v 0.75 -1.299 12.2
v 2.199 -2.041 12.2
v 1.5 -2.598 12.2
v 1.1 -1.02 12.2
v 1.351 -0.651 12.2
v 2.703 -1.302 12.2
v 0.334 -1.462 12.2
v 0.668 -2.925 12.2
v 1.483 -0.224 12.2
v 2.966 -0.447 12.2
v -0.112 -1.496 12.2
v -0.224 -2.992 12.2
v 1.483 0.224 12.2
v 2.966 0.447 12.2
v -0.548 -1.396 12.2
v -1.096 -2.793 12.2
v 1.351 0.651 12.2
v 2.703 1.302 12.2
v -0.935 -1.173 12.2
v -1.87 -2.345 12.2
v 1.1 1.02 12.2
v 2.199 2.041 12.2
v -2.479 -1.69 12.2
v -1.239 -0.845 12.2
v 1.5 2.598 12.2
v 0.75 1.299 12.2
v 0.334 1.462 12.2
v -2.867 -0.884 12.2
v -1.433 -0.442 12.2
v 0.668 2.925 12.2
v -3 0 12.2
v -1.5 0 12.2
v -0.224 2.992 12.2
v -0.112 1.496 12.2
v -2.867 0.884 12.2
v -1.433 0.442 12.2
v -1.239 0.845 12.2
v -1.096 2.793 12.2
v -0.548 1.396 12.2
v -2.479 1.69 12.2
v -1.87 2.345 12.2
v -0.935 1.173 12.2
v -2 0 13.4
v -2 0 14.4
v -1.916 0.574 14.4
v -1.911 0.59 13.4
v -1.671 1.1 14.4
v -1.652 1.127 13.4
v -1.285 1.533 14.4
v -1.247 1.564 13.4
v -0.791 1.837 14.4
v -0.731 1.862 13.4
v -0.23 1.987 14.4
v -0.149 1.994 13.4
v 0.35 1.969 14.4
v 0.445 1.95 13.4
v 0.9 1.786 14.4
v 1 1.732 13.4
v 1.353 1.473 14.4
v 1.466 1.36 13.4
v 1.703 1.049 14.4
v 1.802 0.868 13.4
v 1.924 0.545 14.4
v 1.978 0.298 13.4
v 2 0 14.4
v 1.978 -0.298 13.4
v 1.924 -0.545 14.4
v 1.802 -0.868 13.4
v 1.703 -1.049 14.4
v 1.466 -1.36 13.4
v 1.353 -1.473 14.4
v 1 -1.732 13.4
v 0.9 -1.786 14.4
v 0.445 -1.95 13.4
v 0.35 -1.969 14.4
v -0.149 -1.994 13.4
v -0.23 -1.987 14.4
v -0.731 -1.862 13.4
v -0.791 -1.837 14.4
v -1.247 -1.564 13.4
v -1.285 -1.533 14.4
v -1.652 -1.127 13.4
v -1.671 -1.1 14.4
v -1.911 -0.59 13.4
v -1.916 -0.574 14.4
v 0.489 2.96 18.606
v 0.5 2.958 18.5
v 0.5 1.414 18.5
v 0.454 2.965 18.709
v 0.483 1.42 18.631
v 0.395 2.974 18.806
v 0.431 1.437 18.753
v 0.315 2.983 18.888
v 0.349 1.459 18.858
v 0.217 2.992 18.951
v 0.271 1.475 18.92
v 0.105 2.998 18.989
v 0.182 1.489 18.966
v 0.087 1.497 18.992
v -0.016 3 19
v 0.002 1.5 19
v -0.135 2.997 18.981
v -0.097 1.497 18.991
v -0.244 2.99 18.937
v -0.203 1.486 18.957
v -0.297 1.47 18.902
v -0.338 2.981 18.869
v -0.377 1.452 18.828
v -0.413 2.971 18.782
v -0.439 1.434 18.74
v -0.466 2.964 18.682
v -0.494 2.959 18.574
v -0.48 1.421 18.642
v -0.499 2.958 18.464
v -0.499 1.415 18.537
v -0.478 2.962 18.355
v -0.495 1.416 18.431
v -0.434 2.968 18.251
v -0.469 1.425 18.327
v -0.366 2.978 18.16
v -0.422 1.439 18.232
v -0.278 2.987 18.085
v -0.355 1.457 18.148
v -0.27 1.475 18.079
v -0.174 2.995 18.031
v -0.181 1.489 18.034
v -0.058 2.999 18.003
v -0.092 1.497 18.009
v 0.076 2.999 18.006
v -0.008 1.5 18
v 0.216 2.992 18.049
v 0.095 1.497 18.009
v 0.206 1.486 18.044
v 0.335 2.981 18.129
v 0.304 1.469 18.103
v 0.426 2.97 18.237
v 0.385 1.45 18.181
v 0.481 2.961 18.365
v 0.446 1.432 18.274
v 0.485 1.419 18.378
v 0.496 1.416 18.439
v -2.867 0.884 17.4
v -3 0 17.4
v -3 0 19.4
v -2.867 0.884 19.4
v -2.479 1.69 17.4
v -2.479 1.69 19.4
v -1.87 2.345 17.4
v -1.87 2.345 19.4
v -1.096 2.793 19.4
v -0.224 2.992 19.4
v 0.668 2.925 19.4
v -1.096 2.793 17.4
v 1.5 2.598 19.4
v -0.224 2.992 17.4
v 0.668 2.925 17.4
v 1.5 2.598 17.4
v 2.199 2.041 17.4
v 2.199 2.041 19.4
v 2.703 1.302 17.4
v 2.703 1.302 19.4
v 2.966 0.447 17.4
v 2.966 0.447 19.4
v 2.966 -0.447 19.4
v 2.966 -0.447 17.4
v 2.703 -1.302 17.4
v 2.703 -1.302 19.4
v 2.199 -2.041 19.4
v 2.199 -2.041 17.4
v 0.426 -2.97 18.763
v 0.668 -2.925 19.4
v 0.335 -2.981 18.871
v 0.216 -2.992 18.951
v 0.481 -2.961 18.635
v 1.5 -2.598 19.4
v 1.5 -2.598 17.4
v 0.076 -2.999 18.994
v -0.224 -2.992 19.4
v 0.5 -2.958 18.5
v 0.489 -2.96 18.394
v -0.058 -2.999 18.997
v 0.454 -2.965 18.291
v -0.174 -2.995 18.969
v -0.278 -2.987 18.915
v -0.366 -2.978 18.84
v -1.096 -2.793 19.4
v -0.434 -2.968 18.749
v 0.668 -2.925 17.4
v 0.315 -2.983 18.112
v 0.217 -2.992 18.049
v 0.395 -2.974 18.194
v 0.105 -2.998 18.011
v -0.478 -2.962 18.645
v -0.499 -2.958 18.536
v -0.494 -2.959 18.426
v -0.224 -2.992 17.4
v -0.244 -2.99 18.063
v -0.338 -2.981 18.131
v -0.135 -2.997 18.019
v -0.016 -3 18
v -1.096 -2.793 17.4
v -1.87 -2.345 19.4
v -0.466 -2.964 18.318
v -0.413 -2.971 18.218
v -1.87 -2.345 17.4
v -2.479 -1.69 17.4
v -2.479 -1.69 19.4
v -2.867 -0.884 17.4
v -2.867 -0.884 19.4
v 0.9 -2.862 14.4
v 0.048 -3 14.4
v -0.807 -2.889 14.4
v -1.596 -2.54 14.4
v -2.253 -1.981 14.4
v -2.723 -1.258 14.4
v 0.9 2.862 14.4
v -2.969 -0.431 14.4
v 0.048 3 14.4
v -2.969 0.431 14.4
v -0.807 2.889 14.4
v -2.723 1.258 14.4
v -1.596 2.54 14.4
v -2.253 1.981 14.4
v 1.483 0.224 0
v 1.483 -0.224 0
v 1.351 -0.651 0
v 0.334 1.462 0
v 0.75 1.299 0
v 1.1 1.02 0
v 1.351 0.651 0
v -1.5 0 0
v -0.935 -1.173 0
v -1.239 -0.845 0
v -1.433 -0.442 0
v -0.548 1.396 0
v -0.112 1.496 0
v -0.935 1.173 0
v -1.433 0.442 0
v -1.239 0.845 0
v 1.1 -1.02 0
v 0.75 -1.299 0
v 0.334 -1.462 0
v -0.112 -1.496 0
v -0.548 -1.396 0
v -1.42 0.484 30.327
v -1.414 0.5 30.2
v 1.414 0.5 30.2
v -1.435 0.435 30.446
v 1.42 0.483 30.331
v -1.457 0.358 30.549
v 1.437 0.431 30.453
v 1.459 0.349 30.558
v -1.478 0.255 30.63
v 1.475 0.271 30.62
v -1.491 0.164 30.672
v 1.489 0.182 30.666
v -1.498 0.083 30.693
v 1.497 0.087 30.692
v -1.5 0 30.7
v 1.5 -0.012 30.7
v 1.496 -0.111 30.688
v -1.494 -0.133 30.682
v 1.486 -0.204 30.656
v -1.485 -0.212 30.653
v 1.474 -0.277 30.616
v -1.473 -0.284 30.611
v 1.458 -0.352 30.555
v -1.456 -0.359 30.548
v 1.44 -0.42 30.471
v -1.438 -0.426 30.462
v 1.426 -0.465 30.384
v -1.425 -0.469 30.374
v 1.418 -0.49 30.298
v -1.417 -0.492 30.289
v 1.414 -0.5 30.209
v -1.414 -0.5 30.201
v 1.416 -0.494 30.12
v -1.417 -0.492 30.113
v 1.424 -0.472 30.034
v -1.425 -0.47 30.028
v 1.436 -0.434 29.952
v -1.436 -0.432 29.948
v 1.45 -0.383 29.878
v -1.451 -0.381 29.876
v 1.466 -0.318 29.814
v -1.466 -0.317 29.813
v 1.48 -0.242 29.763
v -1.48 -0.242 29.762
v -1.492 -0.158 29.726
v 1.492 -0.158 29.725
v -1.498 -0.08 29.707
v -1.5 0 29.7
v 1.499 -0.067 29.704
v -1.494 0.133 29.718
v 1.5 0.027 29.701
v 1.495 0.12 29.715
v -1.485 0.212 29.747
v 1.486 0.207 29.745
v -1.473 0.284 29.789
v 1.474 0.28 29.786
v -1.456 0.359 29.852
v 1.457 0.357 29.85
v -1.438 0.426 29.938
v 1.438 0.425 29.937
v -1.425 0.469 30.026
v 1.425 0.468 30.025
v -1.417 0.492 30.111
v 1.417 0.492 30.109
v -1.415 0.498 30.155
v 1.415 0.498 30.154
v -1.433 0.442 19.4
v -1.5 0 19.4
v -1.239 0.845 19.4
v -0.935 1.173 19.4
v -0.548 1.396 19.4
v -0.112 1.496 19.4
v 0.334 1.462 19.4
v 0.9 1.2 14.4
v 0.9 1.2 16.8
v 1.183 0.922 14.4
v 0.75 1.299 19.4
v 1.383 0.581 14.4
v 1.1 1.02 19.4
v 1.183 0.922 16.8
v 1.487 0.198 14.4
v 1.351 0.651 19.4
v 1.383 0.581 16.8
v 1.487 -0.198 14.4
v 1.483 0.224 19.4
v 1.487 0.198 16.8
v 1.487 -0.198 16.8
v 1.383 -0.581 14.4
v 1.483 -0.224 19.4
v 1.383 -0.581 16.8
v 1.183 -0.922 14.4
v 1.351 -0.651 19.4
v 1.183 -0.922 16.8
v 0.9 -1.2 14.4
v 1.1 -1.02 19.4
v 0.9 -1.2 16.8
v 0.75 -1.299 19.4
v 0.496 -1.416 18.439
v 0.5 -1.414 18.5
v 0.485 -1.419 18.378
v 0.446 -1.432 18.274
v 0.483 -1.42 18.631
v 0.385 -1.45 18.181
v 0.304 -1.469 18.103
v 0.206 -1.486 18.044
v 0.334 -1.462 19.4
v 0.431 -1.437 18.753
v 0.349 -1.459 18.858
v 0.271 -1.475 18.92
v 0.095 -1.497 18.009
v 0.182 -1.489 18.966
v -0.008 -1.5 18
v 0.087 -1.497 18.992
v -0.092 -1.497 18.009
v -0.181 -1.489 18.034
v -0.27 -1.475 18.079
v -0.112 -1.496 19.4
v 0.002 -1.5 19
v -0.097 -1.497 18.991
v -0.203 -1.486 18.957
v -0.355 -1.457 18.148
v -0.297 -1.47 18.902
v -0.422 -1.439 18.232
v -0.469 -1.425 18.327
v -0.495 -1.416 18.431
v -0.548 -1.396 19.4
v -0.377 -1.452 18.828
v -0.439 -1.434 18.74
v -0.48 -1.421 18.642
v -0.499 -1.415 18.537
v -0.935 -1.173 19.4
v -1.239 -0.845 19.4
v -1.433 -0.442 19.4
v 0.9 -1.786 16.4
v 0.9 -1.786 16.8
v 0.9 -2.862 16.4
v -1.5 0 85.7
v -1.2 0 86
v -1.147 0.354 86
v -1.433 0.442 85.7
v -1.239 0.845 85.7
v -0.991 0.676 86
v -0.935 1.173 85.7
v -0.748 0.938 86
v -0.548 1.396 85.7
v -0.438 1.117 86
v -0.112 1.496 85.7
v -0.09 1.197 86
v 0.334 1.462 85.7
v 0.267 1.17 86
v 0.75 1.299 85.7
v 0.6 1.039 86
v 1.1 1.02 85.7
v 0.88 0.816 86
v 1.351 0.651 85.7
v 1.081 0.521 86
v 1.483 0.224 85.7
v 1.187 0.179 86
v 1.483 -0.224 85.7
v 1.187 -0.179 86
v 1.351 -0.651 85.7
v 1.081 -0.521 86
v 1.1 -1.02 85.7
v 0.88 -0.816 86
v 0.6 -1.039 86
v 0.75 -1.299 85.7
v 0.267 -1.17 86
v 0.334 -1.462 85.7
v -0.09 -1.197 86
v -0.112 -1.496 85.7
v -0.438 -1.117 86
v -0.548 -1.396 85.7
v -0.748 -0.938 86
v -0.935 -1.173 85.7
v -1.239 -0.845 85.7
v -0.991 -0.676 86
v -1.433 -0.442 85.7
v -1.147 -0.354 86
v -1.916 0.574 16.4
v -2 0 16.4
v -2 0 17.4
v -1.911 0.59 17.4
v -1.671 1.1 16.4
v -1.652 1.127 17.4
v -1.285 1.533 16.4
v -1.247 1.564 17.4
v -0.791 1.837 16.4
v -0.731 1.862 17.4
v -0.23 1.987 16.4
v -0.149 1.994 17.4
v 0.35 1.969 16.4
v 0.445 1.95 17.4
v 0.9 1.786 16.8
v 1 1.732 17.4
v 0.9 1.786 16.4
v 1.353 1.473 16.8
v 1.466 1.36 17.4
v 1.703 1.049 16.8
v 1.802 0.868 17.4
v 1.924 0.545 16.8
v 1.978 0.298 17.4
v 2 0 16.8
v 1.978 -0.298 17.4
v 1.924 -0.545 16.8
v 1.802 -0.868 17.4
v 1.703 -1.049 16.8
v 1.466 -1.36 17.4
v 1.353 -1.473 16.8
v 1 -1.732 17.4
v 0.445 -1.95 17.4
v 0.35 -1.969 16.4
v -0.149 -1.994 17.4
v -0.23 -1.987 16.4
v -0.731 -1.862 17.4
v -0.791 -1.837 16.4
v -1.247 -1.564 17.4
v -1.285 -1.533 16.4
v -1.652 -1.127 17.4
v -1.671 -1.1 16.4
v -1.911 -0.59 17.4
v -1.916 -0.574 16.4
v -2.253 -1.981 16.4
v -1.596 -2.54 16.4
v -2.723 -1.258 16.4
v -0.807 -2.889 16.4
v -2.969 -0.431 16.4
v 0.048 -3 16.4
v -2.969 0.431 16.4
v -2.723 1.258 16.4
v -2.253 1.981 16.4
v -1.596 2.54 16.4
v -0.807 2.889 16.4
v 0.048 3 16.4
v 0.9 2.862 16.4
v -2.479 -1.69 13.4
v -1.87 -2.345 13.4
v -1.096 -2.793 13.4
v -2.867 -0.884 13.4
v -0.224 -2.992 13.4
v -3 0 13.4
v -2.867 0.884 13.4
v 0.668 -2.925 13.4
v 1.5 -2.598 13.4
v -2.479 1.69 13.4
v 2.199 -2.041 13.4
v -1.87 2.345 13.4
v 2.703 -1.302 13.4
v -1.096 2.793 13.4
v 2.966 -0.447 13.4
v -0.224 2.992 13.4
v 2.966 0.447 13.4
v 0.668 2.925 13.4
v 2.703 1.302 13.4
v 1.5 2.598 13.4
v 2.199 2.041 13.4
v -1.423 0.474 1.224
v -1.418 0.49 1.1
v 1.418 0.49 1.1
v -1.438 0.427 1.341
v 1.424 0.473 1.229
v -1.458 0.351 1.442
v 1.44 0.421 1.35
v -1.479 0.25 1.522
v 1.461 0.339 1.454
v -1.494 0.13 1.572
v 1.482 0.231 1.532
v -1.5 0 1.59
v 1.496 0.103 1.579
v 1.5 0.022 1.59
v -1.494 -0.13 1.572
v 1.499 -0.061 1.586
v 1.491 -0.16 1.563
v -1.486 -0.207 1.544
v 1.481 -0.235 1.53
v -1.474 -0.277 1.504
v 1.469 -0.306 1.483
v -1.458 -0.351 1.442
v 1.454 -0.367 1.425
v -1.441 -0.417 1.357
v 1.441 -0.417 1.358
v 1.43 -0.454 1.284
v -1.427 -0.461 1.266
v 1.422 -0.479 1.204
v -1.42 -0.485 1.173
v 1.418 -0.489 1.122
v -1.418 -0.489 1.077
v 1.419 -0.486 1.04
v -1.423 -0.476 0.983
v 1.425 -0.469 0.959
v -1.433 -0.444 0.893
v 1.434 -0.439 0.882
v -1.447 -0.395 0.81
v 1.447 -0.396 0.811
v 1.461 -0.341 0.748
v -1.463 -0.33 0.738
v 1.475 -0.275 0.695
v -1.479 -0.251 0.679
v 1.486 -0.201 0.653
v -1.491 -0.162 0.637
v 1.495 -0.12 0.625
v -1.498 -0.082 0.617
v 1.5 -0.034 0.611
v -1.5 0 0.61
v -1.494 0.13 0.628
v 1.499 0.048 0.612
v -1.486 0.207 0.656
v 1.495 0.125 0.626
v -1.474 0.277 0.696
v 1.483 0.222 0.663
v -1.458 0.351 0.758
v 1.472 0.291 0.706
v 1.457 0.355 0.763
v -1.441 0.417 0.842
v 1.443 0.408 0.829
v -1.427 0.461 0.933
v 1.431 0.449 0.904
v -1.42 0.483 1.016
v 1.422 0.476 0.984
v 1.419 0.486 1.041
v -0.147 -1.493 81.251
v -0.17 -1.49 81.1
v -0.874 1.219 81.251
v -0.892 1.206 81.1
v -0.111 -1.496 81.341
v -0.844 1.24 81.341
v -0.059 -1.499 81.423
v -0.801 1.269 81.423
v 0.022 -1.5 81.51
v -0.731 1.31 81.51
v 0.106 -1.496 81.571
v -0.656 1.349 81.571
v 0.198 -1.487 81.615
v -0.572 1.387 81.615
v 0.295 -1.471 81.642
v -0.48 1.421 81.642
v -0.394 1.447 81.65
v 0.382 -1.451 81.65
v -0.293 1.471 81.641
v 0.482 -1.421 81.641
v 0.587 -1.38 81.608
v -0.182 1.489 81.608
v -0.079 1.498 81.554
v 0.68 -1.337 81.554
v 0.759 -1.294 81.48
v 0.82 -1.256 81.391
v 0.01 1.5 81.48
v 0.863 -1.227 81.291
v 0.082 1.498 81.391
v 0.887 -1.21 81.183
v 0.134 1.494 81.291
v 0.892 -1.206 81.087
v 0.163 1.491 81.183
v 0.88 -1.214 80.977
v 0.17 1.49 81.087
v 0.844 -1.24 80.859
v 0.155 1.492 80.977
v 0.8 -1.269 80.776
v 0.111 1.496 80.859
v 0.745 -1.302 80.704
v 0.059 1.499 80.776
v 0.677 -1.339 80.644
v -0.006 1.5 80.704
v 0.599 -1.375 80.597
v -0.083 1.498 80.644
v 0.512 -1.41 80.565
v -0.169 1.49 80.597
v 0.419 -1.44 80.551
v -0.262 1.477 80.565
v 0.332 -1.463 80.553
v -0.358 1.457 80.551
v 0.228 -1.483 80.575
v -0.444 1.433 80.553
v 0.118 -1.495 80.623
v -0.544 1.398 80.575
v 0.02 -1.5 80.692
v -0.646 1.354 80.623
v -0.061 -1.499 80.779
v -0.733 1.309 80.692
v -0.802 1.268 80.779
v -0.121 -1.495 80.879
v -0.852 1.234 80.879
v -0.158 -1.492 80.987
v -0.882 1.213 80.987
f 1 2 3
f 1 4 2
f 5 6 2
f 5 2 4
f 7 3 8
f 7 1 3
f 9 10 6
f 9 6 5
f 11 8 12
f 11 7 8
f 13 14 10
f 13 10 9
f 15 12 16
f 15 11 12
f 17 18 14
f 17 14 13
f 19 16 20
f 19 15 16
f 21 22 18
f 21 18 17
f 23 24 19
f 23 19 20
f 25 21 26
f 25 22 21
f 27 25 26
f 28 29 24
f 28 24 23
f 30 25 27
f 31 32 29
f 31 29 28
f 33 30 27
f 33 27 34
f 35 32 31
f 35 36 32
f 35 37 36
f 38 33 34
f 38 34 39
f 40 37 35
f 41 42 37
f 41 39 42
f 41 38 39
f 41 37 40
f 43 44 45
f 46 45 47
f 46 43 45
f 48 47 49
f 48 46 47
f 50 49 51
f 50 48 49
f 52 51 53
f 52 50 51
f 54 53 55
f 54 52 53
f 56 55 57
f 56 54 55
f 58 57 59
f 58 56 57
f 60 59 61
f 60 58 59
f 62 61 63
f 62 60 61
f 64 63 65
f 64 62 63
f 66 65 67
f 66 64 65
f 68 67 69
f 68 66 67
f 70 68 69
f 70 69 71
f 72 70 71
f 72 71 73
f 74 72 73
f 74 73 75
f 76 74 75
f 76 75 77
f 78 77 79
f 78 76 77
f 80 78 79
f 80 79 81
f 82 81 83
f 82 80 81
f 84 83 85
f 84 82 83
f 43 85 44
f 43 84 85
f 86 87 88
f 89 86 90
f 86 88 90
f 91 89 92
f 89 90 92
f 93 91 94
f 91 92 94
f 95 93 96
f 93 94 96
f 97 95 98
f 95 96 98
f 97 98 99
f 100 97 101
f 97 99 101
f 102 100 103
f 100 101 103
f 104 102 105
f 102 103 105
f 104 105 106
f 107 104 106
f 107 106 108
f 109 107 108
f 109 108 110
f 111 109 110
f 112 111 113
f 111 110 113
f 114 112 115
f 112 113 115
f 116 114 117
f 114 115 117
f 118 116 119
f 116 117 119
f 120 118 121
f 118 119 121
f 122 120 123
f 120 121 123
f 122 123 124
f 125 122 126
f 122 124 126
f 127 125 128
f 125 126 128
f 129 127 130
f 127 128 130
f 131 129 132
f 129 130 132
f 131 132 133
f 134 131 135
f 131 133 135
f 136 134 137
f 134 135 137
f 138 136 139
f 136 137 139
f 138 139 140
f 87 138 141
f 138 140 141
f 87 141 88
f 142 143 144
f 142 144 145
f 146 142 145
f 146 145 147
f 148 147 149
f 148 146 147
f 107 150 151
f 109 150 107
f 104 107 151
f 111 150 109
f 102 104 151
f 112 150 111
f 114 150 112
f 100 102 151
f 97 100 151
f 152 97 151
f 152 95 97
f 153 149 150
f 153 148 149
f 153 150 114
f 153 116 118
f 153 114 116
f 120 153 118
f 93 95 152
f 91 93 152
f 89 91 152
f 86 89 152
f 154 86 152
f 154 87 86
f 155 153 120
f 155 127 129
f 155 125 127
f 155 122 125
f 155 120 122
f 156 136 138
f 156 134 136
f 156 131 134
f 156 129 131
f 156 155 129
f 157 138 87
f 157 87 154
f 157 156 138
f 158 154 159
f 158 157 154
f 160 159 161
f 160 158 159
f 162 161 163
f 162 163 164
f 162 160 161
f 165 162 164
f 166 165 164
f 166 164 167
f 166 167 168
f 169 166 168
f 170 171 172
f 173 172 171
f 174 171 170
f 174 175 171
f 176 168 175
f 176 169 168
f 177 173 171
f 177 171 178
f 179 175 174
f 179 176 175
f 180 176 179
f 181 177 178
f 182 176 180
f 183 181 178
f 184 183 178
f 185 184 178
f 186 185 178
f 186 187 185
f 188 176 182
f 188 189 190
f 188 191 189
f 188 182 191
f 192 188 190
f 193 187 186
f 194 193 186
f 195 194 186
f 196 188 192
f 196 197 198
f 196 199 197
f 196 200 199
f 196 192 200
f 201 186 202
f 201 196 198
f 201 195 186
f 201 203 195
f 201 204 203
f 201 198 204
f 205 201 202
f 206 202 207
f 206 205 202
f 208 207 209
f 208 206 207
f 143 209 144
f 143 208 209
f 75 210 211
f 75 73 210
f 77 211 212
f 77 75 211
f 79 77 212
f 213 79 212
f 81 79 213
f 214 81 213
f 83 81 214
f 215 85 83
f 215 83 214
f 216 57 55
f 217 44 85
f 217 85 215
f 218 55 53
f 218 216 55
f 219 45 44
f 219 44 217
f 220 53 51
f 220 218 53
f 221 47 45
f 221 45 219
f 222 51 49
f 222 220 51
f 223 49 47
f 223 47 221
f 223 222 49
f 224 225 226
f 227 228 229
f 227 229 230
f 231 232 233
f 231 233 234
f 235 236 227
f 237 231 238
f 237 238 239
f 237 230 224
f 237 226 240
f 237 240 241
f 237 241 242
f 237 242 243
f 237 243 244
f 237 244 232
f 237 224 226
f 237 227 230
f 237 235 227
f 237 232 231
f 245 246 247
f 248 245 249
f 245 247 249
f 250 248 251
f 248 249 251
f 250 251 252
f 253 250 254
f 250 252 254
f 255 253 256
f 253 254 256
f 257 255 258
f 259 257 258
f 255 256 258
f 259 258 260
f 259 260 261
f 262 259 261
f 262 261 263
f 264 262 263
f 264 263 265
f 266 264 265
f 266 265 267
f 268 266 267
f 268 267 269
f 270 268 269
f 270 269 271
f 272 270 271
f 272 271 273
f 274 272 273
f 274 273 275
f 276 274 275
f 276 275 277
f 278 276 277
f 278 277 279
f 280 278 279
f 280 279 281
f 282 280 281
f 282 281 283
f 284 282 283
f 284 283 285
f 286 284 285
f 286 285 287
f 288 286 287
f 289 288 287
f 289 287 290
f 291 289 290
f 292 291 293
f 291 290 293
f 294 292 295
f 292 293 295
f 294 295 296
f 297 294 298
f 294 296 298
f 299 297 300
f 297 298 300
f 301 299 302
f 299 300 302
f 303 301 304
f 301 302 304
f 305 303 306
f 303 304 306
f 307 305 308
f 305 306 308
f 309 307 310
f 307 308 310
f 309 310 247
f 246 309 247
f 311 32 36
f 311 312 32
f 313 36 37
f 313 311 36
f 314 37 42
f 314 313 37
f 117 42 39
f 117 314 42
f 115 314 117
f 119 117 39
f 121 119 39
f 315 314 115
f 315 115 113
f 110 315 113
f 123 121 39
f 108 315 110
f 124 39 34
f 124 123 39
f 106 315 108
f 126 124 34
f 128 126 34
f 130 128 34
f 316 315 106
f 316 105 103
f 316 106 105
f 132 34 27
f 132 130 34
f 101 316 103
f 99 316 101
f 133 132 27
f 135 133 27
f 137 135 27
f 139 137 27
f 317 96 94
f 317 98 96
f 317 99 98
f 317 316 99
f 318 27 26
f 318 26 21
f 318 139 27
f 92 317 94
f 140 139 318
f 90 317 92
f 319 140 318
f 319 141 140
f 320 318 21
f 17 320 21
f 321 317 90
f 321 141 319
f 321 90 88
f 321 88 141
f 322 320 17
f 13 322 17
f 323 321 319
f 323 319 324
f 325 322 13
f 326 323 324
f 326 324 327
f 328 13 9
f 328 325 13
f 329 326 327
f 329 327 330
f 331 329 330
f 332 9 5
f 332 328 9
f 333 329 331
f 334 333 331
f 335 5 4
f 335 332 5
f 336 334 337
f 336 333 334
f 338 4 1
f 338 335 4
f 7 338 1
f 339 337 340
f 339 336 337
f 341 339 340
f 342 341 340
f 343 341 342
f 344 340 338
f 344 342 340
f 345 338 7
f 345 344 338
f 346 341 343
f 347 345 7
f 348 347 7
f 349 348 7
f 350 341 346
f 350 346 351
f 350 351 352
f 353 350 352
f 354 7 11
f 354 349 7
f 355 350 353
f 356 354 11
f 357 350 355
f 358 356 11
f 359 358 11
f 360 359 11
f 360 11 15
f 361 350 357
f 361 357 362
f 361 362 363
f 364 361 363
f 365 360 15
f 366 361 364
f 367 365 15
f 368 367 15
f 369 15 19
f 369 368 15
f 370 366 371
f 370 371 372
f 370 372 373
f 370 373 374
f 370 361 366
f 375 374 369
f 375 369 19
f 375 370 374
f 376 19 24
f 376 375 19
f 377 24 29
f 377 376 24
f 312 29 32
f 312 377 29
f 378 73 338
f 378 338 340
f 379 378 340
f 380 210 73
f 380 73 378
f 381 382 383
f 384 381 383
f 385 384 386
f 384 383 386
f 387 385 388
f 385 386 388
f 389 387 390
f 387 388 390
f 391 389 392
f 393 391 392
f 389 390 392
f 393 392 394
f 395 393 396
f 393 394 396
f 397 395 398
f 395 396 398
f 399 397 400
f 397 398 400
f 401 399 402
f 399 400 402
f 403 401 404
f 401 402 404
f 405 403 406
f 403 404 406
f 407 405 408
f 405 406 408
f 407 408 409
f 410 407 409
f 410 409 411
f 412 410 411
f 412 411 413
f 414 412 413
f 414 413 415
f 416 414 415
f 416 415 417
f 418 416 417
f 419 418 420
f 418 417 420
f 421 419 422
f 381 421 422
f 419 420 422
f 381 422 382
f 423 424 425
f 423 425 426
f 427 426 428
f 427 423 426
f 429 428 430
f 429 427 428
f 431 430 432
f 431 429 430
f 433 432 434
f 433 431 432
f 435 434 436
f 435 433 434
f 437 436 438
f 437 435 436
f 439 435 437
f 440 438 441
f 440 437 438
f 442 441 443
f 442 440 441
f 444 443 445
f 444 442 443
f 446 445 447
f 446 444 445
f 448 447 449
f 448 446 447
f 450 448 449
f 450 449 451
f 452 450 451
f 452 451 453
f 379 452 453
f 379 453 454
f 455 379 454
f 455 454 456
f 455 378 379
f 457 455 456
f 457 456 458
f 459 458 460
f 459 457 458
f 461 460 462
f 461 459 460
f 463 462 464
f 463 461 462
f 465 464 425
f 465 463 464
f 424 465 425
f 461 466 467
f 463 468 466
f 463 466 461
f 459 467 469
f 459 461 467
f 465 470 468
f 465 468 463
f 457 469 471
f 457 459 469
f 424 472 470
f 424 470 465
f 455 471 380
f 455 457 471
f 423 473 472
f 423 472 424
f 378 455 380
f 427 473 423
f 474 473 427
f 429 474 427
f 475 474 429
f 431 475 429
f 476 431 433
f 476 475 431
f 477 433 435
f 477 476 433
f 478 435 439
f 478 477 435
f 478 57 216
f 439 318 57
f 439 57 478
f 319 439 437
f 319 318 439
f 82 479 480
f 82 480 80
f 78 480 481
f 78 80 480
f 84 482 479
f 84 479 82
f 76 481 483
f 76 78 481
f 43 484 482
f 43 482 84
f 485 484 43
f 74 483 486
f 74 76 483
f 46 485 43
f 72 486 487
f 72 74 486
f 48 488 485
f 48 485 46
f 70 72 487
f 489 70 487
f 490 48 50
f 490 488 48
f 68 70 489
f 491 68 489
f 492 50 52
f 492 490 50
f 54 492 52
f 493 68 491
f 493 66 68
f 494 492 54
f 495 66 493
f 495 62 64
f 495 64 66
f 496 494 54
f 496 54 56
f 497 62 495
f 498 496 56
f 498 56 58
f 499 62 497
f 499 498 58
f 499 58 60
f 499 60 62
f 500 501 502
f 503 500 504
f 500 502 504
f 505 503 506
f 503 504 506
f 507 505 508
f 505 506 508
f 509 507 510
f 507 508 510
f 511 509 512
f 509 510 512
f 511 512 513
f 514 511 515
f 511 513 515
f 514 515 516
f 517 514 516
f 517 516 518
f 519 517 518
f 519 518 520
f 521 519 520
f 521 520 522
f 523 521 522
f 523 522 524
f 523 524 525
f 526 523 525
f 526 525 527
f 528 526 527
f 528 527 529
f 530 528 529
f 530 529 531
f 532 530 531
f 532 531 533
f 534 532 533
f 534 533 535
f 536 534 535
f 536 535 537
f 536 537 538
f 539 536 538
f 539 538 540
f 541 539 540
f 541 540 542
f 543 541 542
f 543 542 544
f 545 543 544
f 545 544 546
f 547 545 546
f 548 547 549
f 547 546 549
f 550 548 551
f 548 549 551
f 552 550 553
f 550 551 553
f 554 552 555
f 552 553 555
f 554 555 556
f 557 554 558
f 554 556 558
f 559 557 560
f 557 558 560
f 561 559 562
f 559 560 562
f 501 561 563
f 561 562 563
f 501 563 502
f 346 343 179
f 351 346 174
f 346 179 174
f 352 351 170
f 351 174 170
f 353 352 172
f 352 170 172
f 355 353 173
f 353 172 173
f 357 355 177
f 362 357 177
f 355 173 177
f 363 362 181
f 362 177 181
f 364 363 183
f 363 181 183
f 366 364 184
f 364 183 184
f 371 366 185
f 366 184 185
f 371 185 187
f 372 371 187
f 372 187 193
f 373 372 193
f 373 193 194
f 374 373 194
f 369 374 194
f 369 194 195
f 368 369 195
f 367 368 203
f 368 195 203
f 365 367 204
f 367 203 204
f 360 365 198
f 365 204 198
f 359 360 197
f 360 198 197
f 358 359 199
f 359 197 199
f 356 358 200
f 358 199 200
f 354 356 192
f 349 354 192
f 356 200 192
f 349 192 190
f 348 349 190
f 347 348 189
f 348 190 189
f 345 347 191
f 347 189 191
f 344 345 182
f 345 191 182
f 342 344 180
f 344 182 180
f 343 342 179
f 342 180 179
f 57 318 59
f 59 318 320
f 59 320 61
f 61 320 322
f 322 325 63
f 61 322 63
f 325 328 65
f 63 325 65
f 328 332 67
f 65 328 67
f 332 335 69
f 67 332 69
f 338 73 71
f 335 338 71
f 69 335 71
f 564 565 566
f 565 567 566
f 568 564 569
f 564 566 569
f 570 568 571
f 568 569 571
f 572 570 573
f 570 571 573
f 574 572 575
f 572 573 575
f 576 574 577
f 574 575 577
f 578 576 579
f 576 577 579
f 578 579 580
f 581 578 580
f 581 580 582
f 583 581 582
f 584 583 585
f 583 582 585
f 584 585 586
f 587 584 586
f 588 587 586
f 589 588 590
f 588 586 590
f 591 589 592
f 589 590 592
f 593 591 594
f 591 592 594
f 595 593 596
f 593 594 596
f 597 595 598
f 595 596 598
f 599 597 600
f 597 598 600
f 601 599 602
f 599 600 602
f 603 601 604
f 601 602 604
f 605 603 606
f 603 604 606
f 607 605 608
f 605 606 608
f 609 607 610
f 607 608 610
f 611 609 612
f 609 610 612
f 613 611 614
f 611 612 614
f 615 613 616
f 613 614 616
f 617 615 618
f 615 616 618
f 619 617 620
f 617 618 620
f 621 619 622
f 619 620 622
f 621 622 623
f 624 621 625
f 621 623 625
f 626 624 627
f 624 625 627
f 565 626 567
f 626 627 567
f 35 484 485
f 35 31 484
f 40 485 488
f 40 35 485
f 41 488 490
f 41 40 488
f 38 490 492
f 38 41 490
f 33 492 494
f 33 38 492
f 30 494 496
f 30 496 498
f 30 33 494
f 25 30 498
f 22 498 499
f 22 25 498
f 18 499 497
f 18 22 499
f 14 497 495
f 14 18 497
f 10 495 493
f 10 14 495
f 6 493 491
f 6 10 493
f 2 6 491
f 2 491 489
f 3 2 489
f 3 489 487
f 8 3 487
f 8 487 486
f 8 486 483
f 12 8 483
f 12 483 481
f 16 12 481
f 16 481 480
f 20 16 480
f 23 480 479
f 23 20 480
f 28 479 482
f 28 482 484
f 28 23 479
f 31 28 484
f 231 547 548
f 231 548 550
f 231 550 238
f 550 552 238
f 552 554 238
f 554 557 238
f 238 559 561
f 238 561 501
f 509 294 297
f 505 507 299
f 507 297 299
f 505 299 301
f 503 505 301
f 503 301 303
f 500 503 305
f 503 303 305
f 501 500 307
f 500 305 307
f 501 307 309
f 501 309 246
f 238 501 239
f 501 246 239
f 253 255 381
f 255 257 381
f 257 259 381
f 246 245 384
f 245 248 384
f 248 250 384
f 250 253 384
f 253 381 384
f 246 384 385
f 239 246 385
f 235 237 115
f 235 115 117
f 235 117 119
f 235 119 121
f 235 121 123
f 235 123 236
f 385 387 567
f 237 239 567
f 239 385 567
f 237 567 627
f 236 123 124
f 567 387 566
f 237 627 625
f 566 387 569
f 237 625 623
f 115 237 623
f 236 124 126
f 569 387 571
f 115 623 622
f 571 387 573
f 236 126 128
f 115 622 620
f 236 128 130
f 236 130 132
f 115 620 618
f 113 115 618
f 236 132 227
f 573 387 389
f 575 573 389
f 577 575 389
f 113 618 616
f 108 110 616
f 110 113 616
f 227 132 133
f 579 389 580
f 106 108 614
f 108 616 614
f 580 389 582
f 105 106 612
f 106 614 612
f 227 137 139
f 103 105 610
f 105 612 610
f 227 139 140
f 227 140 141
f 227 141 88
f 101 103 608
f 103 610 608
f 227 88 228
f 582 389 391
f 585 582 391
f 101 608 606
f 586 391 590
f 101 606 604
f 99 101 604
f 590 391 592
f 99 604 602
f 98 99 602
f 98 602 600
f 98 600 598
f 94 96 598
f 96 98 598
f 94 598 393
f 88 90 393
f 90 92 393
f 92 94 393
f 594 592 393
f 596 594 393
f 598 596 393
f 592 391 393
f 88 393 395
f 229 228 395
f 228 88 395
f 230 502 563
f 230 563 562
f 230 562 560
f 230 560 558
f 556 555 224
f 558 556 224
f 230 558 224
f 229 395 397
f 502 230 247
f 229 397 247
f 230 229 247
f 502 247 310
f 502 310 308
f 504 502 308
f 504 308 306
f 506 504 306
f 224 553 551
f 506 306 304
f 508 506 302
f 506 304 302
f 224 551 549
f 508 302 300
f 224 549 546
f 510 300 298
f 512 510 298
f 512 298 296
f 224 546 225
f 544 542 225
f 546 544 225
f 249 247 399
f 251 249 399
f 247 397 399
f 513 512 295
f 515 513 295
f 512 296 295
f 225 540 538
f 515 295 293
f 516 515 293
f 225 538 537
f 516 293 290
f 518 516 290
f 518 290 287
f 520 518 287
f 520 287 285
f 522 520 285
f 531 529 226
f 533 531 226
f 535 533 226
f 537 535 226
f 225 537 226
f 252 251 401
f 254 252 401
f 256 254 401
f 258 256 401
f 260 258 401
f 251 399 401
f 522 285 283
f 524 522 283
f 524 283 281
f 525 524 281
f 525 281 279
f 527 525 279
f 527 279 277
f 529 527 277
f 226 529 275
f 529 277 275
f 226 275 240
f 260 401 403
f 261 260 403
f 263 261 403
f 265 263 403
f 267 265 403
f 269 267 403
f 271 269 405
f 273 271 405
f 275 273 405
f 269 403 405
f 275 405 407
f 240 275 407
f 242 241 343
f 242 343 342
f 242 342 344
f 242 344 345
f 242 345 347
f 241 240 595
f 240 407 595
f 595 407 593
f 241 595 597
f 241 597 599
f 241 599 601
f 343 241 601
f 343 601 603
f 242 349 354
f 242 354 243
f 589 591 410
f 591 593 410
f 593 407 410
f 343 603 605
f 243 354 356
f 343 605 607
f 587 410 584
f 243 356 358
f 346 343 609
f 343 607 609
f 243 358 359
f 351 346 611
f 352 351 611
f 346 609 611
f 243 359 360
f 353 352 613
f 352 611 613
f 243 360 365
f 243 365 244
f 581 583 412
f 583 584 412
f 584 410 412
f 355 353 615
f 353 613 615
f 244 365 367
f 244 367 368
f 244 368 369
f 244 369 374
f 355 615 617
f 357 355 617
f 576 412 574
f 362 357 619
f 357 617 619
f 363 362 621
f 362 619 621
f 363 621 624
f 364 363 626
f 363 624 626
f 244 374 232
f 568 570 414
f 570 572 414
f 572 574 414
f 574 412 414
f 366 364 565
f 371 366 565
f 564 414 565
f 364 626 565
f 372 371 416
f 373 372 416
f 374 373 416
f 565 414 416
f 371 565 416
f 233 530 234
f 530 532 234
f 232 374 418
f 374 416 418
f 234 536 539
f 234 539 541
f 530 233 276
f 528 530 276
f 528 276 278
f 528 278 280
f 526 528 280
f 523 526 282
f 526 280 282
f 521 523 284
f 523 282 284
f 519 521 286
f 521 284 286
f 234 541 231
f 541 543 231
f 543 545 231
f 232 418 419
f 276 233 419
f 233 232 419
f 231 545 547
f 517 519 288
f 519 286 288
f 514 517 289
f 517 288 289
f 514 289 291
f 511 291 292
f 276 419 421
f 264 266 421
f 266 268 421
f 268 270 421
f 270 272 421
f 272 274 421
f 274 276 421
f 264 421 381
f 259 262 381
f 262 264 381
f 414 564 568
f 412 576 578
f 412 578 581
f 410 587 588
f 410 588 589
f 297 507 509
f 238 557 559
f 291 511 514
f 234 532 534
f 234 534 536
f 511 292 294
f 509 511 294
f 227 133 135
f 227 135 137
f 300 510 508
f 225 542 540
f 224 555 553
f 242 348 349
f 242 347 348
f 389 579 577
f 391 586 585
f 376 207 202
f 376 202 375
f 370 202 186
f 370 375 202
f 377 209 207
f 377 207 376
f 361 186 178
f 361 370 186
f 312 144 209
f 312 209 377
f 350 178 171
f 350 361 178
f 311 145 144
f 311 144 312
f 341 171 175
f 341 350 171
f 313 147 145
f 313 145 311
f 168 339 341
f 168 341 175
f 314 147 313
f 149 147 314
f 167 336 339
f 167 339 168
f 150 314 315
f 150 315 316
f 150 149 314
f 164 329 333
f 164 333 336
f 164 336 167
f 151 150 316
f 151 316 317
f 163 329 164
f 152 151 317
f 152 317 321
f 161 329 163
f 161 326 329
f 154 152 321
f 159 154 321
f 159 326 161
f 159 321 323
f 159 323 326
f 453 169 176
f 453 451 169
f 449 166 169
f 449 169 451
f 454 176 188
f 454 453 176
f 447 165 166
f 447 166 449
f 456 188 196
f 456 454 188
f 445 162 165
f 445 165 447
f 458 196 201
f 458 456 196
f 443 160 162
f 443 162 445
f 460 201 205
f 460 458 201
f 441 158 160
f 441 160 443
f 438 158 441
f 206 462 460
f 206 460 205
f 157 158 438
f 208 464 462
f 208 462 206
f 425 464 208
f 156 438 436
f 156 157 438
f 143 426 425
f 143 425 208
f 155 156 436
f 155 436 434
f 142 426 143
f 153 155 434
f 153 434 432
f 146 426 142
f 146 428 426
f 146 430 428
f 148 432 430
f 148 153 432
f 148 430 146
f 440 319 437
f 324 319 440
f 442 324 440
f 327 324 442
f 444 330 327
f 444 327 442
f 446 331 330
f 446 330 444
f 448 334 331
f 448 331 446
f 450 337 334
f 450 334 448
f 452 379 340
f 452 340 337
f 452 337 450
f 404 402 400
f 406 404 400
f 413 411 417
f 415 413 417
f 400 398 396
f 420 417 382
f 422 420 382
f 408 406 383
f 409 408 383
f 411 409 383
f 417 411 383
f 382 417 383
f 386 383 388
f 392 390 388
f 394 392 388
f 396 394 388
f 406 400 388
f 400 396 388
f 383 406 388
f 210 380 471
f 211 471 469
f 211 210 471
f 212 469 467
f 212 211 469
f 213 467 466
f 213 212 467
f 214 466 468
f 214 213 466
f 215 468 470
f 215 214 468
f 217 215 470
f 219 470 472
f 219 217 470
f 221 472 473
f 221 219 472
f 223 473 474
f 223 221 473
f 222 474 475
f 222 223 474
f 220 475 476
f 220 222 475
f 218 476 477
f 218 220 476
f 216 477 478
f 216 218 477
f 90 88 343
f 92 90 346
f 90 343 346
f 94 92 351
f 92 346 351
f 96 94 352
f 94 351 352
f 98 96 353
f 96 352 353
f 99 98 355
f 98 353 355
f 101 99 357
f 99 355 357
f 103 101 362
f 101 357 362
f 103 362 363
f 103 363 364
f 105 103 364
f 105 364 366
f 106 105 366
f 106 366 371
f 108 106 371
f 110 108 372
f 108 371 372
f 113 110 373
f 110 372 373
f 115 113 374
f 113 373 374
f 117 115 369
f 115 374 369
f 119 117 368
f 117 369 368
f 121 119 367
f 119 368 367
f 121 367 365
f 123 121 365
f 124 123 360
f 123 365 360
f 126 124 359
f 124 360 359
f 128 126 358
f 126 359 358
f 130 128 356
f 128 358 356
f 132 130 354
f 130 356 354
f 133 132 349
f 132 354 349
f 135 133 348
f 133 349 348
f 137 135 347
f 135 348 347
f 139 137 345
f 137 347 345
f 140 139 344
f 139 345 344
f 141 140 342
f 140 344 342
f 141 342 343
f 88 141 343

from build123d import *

# Parameters (mm, degrees)
F0_W      = 1.5
F0_H      = 86
F2_SIZE2  = 0.3
F2_SIZE   = 0.3
F4_R      = 0.55
F5_DEPTH  = 4
F7_R      = 0.49
F8_DEPTH  = 2
F11_W     = 2.1
F11_H     = 2.4
F12_DEPTH = 3
F6_R      = 0.5
F13_DEPTH = 3
F14_R     = 0.5
F15_DEPTH = 2.5


with BuildPart() as f1:
    # F0 (on Front) → F1 (revolve)
    with BuildSketch(Plane.XZ):
        with Locations((-0.75, 43)):
            Rectangle(F0_W, F0_H)
    revolve(axis=Axis((0, 0, 43), (0, 0, -1)))

    # F2
    f2_edges = [f1.edges().sort_by_distance(p)[0] for p in [
        (1.5, 0, 86),
    ]]
    chamfer(f2_edges, length=F2_SIZE, length2=F2_SIZE2)

    # F4 (on face) → F5 (cut, symmetric)
    with BuildSketch(Plane(origin=(0, 0, 0), x_dir=(-0.9659258263, -0.2588190451, 0), z_dir=(-0.2588190451, 0.9659258263, 0))):
        with Locations((0, 81.1)):
            Circle(F4_R)
    extrude(amount=F5_DEPTH, both=True, mode=Mode.SUBTRACT)

    # F7 (on Right) → F8 (cut, symmetric)
    with BuildSketch(Plane.YZ):
        with Locations((0, 1.1)):
            Circle(F7_R)
    extrude(amount=F8_DEPTH, both=True, mode=Mode.SUBTRACT)


with BuildPart() as f10:
    # F9 (on Front) → F10 (revolve)
    with BuildSketch(Plane.XZ):
        Polygon((-3, 12.2), (-1.5, 12.2), (-1.5, 19.4), (-3, 19.4), (-3, 17.4), (-2, 17.4), (-2, 16.4), (-3, 16.4), (-3, 14.4), (-2, 14.4), (-2, 13.4), (-3, 13.4), align=None)
    revolve(axis=Axis((0, 0, 86), (0, 0, -1)))

    # F11 (on Front) → F12 (cut, symmetric)
    with BuildSketch(Plane.XZ):
        with Locations((1.95, 15.6)):
            Rectangle(F11_W, F11_H)
    extrude(amount=F12_DEPTH, both=True, mode=Mode.SUBTRACT)


with BuildPart() as f13_tool:
    # F6 (on Front) → F13 (new body, symmetric)
    with BuildSketch(Plane.XZ):
        with Locations((0, 18.5)):
            Circle(F6_R)
    extrude(amount=F13_DEPTH, both=True)


with BuildPart() as f1_1:
    add(f1.part)

    # F13: cut by f13_tool
    add(f13_tool.part, mode=Mode.SUBTRACT)

    # F14 (on Right) → F15 (cut, symmetric)
    with BuildSketch(Plane.YZ):
        with Locations((0, 30.2)):
            Circle(F14_R)
    extrude(amount=F15_DEPTH, both=True, mode=Mode.SUBTRACT)


with BuildPart() as f10_1:
    add(f10.part)

    # F13: cut by f13_tool
    add(f13_tool.part, mode=Mode.SUBTRACT)


solid = Compound([f1_1.part, f10_1.part])
